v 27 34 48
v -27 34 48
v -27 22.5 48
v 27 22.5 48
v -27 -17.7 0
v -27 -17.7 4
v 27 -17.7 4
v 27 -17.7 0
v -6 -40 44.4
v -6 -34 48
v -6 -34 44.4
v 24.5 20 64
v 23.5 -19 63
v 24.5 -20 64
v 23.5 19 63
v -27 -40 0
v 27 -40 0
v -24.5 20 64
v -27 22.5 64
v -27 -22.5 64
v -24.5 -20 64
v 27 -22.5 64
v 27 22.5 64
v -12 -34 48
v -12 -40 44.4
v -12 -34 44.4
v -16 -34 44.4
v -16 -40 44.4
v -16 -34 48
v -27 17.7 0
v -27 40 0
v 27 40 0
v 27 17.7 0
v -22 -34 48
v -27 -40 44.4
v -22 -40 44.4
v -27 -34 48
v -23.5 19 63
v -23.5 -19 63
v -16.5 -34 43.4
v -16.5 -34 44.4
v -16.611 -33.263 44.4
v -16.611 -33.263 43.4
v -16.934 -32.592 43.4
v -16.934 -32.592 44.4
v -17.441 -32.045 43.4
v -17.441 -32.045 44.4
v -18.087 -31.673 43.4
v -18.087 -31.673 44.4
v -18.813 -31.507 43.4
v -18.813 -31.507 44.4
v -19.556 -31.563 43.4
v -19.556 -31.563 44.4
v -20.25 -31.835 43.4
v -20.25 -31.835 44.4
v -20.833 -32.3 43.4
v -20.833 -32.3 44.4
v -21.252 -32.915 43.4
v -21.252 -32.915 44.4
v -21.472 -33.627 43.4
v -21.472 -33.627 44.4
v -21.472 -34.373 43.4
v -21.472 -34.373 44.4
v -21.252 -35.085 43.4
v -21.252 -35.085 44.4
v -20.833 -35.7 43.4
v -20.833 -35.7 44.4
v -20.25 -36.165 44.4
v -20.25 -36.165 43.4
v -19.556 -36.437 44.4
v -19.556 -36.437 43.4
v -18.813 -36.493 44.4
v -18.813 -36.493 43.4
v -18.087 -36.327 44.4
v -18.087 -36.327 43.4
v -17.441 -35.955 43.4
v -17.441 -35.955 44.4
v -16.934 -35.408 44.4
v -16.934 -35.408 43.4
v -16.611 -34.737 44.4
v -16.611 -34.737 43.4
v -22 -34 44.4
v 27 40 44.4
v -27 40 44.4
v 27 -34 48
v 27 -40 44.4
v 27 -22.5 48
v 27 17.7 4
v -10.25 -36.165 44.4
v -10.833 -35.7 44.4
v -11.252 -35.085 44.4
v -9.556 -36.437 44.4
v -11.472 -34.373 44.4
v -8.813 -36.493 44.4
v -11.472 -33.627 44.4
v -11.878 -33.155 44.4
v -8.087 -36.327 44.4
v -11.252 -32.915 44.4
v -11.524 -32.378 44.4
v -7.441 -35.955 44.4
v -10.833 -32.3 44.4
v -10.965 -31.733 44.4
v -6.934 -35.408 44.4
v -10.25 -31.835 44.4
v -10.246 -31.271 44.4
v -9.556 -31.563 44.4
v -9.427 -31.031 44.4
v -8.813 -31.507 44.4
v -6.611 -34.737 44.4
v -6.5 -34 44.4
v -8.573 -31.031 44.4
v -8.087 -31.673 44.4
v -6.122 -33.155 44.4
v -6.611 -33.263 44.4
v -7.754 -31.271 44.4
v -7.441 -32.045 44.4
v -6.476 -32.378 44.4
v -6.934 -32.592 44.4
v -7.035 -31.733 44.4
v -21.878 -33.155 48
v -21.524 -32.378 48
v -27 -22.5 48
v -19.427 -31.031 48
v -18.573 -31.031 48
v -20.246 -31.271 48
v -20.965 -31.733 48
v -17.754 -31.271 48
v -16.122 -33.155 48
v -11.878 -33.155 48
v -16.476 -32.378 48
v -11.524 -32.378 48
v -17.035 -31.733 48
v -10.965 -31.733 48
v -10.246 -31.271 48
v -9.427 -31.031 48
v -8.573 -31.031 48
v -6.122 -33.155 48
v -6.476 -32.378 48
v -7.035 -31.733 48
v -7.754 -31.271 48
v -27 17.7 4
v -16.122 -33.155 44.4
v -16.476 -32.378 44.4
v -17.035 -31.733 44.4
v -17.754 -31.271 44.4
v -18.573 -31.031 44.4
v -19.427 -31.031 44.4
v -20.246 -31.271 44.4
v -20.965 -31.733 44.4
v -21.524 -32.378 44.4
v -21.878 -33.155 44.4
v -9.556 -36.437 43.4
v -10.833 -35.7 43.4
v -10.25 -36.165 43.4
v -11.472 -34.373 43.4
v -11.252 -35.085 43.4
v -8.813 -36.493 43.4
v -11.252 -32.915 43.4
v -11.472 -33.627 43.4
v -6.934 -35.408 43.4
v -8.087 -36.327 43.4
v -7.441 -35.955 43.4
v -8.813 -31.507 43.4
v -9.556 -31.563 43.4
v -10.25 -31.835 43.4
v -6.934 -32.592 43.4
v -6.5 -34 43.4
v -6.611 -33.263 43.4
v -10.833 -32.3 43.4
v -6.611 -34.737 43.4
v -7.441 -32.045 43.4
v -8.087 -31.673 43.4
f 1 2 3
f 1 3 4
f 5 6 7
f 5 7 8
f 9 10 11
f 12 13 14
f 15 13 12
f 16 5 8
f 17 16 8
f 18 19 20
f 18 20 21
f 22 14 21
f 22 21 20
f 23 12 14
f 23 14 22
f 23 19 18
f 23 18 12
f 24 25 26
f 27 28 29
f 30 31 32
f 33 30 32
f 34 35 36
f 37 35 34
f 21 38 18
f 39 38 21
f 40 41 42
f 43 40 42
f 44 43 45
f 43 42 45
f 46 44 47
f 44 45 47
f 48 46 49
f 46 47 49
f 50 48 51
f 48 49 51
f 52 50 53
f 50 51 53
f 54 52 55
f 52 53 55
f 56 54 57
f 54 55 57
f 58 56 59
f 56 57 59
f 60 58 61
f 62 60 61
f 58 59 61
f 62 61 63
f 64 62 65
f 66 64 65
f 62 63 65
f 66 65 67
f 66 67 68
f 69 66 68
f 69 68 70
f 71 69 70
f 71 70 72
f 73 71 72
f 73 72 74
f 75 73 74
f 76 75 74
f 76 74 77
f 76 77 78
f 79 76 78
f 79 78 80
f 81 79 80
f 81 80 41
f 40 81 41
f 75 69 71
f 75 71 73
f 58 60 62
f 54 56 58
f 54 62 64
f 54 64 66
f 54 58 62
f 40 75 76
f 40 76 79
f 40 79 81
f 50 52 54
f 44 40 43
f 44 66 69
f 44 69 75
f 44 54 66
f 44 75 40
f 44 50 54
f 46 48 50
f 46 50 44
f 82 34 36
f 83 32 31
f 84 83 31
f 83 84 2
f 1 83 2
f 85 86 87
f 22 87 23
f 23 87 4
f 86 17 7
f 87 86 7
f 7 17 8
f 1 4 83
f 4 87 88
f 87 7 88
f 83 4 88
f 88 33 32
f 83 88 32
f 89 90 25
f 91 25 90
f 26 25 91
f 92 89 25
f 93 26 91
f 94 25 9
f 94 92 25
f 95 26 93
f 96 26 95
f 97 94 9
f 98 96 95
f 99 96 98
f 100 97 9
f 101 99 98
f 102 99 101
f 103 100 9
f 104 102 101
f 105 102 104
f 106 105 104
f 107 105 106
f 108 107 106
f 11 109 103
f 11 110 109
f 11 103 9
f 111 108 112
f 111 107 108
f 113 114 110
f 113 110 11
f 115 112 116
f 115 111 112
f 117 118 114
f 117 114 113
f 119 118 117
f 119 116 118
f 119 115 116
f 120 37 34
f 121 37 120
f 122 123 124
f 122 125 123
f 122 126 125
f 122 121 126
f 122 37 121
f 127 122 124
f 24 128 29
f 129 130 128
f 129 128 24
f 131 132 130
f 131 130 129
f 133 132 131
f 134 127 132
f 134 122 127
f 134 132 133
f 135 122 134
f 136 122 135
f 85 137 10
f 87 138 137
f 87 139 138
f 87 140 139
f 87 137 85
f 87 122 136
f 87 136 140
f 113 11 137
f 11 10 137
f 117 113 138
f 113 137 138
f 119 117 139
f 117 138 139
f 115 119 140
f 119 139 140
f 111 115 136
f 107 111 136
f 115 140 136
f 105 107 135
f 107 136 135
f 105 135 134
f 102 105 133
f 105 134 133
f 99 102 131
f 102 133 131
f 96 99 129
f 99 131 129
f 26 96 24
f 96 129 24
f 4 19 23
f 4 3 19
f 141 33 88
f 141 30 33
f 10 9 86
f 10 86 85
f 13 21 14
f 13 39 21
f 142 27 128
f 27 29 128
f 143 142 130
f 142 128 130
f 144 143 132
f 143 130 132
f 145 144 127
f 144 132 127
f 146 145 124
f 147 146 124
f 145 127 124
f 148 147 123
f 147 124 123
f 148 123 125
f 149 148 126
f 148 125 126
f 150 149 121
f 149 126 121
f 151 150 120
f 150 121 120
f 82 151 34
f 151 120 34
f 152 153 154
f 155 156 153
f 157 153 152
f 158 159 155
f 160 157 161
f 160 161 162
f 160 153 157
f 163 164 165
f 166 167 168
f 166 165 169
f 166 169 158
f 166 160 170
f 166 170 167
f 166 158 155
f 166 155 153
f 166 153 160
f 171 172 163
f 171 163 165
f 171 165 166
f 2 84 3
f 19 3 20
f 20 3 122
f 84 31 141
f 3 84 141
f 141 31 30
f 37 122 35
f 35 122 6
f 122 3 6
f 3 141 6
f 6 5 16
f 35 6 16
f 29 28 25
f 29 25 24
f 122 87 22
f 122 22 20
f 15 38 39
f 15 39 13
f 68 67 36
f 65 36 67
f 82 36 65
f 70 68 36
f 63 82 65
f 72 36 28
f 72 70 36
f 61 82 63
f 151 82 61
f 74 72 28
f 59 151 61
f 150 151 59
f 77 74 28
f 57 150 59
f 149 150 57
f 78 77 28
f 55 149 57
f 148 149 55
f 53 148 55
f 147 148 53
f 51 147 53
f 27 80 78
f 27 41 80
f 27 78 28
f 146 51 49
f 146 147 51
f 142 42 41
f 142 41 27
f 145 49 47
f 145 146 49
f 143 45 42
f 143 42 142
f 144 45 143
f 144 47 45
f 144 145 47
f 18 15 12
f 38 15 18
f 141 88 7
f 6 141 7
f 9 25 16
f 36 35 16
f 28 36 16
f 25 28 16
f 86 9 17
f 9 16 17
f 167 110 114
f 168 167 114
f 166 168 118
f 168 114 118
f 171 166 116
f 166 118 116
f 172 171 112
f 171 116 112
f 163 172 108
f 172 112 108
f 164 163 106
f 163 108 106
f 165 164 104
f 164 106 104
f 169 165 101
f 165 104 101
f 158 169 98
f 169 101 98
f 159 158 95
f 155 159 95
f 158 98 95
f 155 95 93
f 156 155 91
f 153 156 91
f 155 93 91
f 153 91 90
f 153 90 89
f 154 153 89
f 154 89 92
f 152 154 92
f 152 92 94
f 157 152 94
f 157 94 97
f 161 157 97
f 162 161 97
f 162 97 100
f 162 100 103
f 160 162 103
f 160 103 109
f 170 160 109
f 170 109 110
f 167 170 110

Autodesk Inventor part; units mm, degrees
ref_plane "YZ Plane" through (0, 0, 0) normal (1, 0, 0) x (0, 1, 0)
ref_plane "XZ Plane" through (0, 0, 0) normal (0, 1, 0) x (-1, 0, 0)
ref_plane "XY Plane" through (0, 0, 0) normal (0, 0, 1) x (1, 0, 0)
sketch "Base" plane through (0, 0, 0) normal (0, 0, 1) x (1, 0, 0)
  line L0 (-27, -40) -> (27, -40)
  line L1 (27, -40) -> (27, 40)
  line L2 (27, 40) -> (-27, 40)
  line L3 (-27, 40) -> (-27, -40)
  line L4 (-27, -40) -> (27, 40) construction
  line L5 (27, -40) -> (-27, 40) construction
  point P0 (0, 0)
  dimension "d0" = 80
  dimension "d1" = 54
extrude "BaseFeature" add sketch "Base" along normal blind 48
sketch "DINRail" plane through (-27, -40, 0) normal (-1, 0, 0) x (0, 0, 1)
  line L0 (0, 80) -> (0, 0) construction
  line L1 (0, 0) -> (48, 0) construction
  line L2 (48, 80) -> (48, 0) construction
  line L3 (0, 80) -> (48, 80) construction
  line L4 (0, 57.7) -> (4, 57.7)
  line L5 (4, 57.7) -> (4, 22.3)
  line L6 (4, 22.3) -> (0, 22.3)
  line L7 (0, 22.3) -> (0, 57.7)
  line L8 (0, 57.7) -> (4, 22.3) construction
  line L9 (4, 57.7) -> (0, 22.3) construction
  line L10 (0, -16) -> (0, 96) projected
  line L11 (-9.6, 40) -> (57.6, 40) construction
  line L12 (0, 80) -> (0, 0) projected
  point P0 (2, 40)
  point P1 (0, -16)
  point P2 (0, 96)
  dimension "d4" = 4
  dimension "d5" = 35.4
extrude "DinRailFeature" cut sketch "DINRail" against normal through all
sketch "Chamfers" plane through (-27, -40, 48) normal (-1, 0, 0) x (0, 0, 1)
  line L0 (-44, 22.3) -> (-48, 22.3) construction
  line L1 (-48, 22.3) -> (-48, 0) construction
  line L2 (-48, 0) -> (0, 0) projected
  line L3 (0, 80) -> (0, 0) projected
  line L4 (-48, 80) -> (0, 80) projected
  line L5 (-48, 80) -> (-48, 57.7) construction
  line L6 (-48, 57.7) -> (-44, 57.7) construction
  line L7 (-44, 57.7) -> (-44, 22.3) construction
  line L8 (-3.6, 80) -> (0, 74)
  line L9 (-57.6, 40) -> (9.6, 40) construction
  line L10 (-3.6, 0) -> (0, 6)
  point P0 (-48, 40)
  point P1 (0, 6)
  point P2 (-3.6, 0)
  dimension "d8" = 6
  dimension "d9" = 3.6
extrude "ChamfersFeature" cut sketch "Chamfers" against normal through all
sketch "Screen" plane through (0, 0, 48) normal (0, 0, 1) x (1, 0, 0)
  line L0 (27, -34) -> (27, 34) projected
  line L1 (-27, 22.5) -> (27, 22.5)
  line L2 (27, 22.5) -> (27, -22.5)
  line L3 (27, -22.5) -> (-27, -22.5)
  line L4 (-27, -22.5) -> (-27, 22.5)
  line L5 (-27, 22.5) -> (27, -22.5) construction
  line L6 (27, 22.5) -> (-27, -22.5) construction
  point P0 (0, 0)
  dimension "d12" = 45
extrude "ScreenFeature" add sketch "Screen" along normal blind 16
sketch "ScreenBezel" plane through (0, 0, 64) normal (0, 0, 1) x (1, 0, 0)
  line L0 (-24.5, -20) -> (24.5, -20)
  line L1 (24.5, -20) -> (24.5, 20)
  line L2 (24.5, 20) -> (-24.5, 20)
  line L3 (-24.5, 20) -> (-24.5, -20)
  line L4 (-24.5, -20) -> (24.5, 20) construction
  line L5 (24.5, -20) -> (-24.5, 20) construction
  line L6 (27, 22.5) -> (-27, 22.5) projected
  line L7 (27, -22.5) -> (27, 22.5) projected
  point P0 (0, 0)
  dimension "d15" = 2.5
  dimension "d16" = 2.5
extrude "ScreenBezelFeature" cut sketch "ScreenBezel" against normal blind 1
chamfer "ScreenChamferFeature" distance 1 angle 45 4 edges at (-24.5, 0, 63) (0, 20, 63) (24.5, 0, 63) (0, -20, 63)
sketch "SupplyTerminals" plane through (0, 0, 48) normal (0, 0, 1) x (1, 0, 0)
  line L0 (-27, -40) -> (27, -40) projected
  line L1 (-27, -34) -> (27, -34) projected
  line L2 (-22, -40) -> (-16, -40)
  line L3 (-16, -40) -> (-16, -34)
  line L4 (-16, -34) -> (-22, -34)
  line L5 (-22, -34) -> (-22, -40)
  circle A0 centre (-19, -34) radius 3
  line L6 (-27, -40) -> (-27, -34) projected
  line L7 (27, -22.5) -> (-27, -22.5) projected
  line L8 (-14, -22.5) -> (-14, -40) construction
  line L9 (-6, -40) -> (-12, -40)
  line L10 (-12, -40) -> (-12, -34)
  line L11 (-6, -34) -> (-6, -40)
  circle A1 centre (-9, -34) radius 3
  point P0 (0, 0)
  dimension "d23" = 6
  dimension "d24" = 5
  dimension "d25" = 2
extrude "SupplyTerminalsFeature" cut sketch "SupplyTerminals" against normal up to surface (3.6 mm away) contours L5 A0 L3 L0 | A0 L1 | L1 A0 | L10 A1 L11 L0 | A1 L1 | L1 A1
sketch "TerminalScrews" plane through (-19, -34, 44.4) normal (0, 0, 1) x (1, 0, 0)
  arc A0 (3, 0) -> (-3, 0) centre (0, 0) ccw projected
  arc A1 (13, 0) -> (7, 0) centre (10, 0) ccw projected
  circle A2 centre (0, 0) radius 2.5
  circle A3 centre (10, 0) radius 2.5
  point P0 (19, 34)
  dimension "d28" = 5
extrude "TerminalScrewsFeature" cut sketch "TerminalScrews" against normal blind 1
properties part number "EnergyMeter"
